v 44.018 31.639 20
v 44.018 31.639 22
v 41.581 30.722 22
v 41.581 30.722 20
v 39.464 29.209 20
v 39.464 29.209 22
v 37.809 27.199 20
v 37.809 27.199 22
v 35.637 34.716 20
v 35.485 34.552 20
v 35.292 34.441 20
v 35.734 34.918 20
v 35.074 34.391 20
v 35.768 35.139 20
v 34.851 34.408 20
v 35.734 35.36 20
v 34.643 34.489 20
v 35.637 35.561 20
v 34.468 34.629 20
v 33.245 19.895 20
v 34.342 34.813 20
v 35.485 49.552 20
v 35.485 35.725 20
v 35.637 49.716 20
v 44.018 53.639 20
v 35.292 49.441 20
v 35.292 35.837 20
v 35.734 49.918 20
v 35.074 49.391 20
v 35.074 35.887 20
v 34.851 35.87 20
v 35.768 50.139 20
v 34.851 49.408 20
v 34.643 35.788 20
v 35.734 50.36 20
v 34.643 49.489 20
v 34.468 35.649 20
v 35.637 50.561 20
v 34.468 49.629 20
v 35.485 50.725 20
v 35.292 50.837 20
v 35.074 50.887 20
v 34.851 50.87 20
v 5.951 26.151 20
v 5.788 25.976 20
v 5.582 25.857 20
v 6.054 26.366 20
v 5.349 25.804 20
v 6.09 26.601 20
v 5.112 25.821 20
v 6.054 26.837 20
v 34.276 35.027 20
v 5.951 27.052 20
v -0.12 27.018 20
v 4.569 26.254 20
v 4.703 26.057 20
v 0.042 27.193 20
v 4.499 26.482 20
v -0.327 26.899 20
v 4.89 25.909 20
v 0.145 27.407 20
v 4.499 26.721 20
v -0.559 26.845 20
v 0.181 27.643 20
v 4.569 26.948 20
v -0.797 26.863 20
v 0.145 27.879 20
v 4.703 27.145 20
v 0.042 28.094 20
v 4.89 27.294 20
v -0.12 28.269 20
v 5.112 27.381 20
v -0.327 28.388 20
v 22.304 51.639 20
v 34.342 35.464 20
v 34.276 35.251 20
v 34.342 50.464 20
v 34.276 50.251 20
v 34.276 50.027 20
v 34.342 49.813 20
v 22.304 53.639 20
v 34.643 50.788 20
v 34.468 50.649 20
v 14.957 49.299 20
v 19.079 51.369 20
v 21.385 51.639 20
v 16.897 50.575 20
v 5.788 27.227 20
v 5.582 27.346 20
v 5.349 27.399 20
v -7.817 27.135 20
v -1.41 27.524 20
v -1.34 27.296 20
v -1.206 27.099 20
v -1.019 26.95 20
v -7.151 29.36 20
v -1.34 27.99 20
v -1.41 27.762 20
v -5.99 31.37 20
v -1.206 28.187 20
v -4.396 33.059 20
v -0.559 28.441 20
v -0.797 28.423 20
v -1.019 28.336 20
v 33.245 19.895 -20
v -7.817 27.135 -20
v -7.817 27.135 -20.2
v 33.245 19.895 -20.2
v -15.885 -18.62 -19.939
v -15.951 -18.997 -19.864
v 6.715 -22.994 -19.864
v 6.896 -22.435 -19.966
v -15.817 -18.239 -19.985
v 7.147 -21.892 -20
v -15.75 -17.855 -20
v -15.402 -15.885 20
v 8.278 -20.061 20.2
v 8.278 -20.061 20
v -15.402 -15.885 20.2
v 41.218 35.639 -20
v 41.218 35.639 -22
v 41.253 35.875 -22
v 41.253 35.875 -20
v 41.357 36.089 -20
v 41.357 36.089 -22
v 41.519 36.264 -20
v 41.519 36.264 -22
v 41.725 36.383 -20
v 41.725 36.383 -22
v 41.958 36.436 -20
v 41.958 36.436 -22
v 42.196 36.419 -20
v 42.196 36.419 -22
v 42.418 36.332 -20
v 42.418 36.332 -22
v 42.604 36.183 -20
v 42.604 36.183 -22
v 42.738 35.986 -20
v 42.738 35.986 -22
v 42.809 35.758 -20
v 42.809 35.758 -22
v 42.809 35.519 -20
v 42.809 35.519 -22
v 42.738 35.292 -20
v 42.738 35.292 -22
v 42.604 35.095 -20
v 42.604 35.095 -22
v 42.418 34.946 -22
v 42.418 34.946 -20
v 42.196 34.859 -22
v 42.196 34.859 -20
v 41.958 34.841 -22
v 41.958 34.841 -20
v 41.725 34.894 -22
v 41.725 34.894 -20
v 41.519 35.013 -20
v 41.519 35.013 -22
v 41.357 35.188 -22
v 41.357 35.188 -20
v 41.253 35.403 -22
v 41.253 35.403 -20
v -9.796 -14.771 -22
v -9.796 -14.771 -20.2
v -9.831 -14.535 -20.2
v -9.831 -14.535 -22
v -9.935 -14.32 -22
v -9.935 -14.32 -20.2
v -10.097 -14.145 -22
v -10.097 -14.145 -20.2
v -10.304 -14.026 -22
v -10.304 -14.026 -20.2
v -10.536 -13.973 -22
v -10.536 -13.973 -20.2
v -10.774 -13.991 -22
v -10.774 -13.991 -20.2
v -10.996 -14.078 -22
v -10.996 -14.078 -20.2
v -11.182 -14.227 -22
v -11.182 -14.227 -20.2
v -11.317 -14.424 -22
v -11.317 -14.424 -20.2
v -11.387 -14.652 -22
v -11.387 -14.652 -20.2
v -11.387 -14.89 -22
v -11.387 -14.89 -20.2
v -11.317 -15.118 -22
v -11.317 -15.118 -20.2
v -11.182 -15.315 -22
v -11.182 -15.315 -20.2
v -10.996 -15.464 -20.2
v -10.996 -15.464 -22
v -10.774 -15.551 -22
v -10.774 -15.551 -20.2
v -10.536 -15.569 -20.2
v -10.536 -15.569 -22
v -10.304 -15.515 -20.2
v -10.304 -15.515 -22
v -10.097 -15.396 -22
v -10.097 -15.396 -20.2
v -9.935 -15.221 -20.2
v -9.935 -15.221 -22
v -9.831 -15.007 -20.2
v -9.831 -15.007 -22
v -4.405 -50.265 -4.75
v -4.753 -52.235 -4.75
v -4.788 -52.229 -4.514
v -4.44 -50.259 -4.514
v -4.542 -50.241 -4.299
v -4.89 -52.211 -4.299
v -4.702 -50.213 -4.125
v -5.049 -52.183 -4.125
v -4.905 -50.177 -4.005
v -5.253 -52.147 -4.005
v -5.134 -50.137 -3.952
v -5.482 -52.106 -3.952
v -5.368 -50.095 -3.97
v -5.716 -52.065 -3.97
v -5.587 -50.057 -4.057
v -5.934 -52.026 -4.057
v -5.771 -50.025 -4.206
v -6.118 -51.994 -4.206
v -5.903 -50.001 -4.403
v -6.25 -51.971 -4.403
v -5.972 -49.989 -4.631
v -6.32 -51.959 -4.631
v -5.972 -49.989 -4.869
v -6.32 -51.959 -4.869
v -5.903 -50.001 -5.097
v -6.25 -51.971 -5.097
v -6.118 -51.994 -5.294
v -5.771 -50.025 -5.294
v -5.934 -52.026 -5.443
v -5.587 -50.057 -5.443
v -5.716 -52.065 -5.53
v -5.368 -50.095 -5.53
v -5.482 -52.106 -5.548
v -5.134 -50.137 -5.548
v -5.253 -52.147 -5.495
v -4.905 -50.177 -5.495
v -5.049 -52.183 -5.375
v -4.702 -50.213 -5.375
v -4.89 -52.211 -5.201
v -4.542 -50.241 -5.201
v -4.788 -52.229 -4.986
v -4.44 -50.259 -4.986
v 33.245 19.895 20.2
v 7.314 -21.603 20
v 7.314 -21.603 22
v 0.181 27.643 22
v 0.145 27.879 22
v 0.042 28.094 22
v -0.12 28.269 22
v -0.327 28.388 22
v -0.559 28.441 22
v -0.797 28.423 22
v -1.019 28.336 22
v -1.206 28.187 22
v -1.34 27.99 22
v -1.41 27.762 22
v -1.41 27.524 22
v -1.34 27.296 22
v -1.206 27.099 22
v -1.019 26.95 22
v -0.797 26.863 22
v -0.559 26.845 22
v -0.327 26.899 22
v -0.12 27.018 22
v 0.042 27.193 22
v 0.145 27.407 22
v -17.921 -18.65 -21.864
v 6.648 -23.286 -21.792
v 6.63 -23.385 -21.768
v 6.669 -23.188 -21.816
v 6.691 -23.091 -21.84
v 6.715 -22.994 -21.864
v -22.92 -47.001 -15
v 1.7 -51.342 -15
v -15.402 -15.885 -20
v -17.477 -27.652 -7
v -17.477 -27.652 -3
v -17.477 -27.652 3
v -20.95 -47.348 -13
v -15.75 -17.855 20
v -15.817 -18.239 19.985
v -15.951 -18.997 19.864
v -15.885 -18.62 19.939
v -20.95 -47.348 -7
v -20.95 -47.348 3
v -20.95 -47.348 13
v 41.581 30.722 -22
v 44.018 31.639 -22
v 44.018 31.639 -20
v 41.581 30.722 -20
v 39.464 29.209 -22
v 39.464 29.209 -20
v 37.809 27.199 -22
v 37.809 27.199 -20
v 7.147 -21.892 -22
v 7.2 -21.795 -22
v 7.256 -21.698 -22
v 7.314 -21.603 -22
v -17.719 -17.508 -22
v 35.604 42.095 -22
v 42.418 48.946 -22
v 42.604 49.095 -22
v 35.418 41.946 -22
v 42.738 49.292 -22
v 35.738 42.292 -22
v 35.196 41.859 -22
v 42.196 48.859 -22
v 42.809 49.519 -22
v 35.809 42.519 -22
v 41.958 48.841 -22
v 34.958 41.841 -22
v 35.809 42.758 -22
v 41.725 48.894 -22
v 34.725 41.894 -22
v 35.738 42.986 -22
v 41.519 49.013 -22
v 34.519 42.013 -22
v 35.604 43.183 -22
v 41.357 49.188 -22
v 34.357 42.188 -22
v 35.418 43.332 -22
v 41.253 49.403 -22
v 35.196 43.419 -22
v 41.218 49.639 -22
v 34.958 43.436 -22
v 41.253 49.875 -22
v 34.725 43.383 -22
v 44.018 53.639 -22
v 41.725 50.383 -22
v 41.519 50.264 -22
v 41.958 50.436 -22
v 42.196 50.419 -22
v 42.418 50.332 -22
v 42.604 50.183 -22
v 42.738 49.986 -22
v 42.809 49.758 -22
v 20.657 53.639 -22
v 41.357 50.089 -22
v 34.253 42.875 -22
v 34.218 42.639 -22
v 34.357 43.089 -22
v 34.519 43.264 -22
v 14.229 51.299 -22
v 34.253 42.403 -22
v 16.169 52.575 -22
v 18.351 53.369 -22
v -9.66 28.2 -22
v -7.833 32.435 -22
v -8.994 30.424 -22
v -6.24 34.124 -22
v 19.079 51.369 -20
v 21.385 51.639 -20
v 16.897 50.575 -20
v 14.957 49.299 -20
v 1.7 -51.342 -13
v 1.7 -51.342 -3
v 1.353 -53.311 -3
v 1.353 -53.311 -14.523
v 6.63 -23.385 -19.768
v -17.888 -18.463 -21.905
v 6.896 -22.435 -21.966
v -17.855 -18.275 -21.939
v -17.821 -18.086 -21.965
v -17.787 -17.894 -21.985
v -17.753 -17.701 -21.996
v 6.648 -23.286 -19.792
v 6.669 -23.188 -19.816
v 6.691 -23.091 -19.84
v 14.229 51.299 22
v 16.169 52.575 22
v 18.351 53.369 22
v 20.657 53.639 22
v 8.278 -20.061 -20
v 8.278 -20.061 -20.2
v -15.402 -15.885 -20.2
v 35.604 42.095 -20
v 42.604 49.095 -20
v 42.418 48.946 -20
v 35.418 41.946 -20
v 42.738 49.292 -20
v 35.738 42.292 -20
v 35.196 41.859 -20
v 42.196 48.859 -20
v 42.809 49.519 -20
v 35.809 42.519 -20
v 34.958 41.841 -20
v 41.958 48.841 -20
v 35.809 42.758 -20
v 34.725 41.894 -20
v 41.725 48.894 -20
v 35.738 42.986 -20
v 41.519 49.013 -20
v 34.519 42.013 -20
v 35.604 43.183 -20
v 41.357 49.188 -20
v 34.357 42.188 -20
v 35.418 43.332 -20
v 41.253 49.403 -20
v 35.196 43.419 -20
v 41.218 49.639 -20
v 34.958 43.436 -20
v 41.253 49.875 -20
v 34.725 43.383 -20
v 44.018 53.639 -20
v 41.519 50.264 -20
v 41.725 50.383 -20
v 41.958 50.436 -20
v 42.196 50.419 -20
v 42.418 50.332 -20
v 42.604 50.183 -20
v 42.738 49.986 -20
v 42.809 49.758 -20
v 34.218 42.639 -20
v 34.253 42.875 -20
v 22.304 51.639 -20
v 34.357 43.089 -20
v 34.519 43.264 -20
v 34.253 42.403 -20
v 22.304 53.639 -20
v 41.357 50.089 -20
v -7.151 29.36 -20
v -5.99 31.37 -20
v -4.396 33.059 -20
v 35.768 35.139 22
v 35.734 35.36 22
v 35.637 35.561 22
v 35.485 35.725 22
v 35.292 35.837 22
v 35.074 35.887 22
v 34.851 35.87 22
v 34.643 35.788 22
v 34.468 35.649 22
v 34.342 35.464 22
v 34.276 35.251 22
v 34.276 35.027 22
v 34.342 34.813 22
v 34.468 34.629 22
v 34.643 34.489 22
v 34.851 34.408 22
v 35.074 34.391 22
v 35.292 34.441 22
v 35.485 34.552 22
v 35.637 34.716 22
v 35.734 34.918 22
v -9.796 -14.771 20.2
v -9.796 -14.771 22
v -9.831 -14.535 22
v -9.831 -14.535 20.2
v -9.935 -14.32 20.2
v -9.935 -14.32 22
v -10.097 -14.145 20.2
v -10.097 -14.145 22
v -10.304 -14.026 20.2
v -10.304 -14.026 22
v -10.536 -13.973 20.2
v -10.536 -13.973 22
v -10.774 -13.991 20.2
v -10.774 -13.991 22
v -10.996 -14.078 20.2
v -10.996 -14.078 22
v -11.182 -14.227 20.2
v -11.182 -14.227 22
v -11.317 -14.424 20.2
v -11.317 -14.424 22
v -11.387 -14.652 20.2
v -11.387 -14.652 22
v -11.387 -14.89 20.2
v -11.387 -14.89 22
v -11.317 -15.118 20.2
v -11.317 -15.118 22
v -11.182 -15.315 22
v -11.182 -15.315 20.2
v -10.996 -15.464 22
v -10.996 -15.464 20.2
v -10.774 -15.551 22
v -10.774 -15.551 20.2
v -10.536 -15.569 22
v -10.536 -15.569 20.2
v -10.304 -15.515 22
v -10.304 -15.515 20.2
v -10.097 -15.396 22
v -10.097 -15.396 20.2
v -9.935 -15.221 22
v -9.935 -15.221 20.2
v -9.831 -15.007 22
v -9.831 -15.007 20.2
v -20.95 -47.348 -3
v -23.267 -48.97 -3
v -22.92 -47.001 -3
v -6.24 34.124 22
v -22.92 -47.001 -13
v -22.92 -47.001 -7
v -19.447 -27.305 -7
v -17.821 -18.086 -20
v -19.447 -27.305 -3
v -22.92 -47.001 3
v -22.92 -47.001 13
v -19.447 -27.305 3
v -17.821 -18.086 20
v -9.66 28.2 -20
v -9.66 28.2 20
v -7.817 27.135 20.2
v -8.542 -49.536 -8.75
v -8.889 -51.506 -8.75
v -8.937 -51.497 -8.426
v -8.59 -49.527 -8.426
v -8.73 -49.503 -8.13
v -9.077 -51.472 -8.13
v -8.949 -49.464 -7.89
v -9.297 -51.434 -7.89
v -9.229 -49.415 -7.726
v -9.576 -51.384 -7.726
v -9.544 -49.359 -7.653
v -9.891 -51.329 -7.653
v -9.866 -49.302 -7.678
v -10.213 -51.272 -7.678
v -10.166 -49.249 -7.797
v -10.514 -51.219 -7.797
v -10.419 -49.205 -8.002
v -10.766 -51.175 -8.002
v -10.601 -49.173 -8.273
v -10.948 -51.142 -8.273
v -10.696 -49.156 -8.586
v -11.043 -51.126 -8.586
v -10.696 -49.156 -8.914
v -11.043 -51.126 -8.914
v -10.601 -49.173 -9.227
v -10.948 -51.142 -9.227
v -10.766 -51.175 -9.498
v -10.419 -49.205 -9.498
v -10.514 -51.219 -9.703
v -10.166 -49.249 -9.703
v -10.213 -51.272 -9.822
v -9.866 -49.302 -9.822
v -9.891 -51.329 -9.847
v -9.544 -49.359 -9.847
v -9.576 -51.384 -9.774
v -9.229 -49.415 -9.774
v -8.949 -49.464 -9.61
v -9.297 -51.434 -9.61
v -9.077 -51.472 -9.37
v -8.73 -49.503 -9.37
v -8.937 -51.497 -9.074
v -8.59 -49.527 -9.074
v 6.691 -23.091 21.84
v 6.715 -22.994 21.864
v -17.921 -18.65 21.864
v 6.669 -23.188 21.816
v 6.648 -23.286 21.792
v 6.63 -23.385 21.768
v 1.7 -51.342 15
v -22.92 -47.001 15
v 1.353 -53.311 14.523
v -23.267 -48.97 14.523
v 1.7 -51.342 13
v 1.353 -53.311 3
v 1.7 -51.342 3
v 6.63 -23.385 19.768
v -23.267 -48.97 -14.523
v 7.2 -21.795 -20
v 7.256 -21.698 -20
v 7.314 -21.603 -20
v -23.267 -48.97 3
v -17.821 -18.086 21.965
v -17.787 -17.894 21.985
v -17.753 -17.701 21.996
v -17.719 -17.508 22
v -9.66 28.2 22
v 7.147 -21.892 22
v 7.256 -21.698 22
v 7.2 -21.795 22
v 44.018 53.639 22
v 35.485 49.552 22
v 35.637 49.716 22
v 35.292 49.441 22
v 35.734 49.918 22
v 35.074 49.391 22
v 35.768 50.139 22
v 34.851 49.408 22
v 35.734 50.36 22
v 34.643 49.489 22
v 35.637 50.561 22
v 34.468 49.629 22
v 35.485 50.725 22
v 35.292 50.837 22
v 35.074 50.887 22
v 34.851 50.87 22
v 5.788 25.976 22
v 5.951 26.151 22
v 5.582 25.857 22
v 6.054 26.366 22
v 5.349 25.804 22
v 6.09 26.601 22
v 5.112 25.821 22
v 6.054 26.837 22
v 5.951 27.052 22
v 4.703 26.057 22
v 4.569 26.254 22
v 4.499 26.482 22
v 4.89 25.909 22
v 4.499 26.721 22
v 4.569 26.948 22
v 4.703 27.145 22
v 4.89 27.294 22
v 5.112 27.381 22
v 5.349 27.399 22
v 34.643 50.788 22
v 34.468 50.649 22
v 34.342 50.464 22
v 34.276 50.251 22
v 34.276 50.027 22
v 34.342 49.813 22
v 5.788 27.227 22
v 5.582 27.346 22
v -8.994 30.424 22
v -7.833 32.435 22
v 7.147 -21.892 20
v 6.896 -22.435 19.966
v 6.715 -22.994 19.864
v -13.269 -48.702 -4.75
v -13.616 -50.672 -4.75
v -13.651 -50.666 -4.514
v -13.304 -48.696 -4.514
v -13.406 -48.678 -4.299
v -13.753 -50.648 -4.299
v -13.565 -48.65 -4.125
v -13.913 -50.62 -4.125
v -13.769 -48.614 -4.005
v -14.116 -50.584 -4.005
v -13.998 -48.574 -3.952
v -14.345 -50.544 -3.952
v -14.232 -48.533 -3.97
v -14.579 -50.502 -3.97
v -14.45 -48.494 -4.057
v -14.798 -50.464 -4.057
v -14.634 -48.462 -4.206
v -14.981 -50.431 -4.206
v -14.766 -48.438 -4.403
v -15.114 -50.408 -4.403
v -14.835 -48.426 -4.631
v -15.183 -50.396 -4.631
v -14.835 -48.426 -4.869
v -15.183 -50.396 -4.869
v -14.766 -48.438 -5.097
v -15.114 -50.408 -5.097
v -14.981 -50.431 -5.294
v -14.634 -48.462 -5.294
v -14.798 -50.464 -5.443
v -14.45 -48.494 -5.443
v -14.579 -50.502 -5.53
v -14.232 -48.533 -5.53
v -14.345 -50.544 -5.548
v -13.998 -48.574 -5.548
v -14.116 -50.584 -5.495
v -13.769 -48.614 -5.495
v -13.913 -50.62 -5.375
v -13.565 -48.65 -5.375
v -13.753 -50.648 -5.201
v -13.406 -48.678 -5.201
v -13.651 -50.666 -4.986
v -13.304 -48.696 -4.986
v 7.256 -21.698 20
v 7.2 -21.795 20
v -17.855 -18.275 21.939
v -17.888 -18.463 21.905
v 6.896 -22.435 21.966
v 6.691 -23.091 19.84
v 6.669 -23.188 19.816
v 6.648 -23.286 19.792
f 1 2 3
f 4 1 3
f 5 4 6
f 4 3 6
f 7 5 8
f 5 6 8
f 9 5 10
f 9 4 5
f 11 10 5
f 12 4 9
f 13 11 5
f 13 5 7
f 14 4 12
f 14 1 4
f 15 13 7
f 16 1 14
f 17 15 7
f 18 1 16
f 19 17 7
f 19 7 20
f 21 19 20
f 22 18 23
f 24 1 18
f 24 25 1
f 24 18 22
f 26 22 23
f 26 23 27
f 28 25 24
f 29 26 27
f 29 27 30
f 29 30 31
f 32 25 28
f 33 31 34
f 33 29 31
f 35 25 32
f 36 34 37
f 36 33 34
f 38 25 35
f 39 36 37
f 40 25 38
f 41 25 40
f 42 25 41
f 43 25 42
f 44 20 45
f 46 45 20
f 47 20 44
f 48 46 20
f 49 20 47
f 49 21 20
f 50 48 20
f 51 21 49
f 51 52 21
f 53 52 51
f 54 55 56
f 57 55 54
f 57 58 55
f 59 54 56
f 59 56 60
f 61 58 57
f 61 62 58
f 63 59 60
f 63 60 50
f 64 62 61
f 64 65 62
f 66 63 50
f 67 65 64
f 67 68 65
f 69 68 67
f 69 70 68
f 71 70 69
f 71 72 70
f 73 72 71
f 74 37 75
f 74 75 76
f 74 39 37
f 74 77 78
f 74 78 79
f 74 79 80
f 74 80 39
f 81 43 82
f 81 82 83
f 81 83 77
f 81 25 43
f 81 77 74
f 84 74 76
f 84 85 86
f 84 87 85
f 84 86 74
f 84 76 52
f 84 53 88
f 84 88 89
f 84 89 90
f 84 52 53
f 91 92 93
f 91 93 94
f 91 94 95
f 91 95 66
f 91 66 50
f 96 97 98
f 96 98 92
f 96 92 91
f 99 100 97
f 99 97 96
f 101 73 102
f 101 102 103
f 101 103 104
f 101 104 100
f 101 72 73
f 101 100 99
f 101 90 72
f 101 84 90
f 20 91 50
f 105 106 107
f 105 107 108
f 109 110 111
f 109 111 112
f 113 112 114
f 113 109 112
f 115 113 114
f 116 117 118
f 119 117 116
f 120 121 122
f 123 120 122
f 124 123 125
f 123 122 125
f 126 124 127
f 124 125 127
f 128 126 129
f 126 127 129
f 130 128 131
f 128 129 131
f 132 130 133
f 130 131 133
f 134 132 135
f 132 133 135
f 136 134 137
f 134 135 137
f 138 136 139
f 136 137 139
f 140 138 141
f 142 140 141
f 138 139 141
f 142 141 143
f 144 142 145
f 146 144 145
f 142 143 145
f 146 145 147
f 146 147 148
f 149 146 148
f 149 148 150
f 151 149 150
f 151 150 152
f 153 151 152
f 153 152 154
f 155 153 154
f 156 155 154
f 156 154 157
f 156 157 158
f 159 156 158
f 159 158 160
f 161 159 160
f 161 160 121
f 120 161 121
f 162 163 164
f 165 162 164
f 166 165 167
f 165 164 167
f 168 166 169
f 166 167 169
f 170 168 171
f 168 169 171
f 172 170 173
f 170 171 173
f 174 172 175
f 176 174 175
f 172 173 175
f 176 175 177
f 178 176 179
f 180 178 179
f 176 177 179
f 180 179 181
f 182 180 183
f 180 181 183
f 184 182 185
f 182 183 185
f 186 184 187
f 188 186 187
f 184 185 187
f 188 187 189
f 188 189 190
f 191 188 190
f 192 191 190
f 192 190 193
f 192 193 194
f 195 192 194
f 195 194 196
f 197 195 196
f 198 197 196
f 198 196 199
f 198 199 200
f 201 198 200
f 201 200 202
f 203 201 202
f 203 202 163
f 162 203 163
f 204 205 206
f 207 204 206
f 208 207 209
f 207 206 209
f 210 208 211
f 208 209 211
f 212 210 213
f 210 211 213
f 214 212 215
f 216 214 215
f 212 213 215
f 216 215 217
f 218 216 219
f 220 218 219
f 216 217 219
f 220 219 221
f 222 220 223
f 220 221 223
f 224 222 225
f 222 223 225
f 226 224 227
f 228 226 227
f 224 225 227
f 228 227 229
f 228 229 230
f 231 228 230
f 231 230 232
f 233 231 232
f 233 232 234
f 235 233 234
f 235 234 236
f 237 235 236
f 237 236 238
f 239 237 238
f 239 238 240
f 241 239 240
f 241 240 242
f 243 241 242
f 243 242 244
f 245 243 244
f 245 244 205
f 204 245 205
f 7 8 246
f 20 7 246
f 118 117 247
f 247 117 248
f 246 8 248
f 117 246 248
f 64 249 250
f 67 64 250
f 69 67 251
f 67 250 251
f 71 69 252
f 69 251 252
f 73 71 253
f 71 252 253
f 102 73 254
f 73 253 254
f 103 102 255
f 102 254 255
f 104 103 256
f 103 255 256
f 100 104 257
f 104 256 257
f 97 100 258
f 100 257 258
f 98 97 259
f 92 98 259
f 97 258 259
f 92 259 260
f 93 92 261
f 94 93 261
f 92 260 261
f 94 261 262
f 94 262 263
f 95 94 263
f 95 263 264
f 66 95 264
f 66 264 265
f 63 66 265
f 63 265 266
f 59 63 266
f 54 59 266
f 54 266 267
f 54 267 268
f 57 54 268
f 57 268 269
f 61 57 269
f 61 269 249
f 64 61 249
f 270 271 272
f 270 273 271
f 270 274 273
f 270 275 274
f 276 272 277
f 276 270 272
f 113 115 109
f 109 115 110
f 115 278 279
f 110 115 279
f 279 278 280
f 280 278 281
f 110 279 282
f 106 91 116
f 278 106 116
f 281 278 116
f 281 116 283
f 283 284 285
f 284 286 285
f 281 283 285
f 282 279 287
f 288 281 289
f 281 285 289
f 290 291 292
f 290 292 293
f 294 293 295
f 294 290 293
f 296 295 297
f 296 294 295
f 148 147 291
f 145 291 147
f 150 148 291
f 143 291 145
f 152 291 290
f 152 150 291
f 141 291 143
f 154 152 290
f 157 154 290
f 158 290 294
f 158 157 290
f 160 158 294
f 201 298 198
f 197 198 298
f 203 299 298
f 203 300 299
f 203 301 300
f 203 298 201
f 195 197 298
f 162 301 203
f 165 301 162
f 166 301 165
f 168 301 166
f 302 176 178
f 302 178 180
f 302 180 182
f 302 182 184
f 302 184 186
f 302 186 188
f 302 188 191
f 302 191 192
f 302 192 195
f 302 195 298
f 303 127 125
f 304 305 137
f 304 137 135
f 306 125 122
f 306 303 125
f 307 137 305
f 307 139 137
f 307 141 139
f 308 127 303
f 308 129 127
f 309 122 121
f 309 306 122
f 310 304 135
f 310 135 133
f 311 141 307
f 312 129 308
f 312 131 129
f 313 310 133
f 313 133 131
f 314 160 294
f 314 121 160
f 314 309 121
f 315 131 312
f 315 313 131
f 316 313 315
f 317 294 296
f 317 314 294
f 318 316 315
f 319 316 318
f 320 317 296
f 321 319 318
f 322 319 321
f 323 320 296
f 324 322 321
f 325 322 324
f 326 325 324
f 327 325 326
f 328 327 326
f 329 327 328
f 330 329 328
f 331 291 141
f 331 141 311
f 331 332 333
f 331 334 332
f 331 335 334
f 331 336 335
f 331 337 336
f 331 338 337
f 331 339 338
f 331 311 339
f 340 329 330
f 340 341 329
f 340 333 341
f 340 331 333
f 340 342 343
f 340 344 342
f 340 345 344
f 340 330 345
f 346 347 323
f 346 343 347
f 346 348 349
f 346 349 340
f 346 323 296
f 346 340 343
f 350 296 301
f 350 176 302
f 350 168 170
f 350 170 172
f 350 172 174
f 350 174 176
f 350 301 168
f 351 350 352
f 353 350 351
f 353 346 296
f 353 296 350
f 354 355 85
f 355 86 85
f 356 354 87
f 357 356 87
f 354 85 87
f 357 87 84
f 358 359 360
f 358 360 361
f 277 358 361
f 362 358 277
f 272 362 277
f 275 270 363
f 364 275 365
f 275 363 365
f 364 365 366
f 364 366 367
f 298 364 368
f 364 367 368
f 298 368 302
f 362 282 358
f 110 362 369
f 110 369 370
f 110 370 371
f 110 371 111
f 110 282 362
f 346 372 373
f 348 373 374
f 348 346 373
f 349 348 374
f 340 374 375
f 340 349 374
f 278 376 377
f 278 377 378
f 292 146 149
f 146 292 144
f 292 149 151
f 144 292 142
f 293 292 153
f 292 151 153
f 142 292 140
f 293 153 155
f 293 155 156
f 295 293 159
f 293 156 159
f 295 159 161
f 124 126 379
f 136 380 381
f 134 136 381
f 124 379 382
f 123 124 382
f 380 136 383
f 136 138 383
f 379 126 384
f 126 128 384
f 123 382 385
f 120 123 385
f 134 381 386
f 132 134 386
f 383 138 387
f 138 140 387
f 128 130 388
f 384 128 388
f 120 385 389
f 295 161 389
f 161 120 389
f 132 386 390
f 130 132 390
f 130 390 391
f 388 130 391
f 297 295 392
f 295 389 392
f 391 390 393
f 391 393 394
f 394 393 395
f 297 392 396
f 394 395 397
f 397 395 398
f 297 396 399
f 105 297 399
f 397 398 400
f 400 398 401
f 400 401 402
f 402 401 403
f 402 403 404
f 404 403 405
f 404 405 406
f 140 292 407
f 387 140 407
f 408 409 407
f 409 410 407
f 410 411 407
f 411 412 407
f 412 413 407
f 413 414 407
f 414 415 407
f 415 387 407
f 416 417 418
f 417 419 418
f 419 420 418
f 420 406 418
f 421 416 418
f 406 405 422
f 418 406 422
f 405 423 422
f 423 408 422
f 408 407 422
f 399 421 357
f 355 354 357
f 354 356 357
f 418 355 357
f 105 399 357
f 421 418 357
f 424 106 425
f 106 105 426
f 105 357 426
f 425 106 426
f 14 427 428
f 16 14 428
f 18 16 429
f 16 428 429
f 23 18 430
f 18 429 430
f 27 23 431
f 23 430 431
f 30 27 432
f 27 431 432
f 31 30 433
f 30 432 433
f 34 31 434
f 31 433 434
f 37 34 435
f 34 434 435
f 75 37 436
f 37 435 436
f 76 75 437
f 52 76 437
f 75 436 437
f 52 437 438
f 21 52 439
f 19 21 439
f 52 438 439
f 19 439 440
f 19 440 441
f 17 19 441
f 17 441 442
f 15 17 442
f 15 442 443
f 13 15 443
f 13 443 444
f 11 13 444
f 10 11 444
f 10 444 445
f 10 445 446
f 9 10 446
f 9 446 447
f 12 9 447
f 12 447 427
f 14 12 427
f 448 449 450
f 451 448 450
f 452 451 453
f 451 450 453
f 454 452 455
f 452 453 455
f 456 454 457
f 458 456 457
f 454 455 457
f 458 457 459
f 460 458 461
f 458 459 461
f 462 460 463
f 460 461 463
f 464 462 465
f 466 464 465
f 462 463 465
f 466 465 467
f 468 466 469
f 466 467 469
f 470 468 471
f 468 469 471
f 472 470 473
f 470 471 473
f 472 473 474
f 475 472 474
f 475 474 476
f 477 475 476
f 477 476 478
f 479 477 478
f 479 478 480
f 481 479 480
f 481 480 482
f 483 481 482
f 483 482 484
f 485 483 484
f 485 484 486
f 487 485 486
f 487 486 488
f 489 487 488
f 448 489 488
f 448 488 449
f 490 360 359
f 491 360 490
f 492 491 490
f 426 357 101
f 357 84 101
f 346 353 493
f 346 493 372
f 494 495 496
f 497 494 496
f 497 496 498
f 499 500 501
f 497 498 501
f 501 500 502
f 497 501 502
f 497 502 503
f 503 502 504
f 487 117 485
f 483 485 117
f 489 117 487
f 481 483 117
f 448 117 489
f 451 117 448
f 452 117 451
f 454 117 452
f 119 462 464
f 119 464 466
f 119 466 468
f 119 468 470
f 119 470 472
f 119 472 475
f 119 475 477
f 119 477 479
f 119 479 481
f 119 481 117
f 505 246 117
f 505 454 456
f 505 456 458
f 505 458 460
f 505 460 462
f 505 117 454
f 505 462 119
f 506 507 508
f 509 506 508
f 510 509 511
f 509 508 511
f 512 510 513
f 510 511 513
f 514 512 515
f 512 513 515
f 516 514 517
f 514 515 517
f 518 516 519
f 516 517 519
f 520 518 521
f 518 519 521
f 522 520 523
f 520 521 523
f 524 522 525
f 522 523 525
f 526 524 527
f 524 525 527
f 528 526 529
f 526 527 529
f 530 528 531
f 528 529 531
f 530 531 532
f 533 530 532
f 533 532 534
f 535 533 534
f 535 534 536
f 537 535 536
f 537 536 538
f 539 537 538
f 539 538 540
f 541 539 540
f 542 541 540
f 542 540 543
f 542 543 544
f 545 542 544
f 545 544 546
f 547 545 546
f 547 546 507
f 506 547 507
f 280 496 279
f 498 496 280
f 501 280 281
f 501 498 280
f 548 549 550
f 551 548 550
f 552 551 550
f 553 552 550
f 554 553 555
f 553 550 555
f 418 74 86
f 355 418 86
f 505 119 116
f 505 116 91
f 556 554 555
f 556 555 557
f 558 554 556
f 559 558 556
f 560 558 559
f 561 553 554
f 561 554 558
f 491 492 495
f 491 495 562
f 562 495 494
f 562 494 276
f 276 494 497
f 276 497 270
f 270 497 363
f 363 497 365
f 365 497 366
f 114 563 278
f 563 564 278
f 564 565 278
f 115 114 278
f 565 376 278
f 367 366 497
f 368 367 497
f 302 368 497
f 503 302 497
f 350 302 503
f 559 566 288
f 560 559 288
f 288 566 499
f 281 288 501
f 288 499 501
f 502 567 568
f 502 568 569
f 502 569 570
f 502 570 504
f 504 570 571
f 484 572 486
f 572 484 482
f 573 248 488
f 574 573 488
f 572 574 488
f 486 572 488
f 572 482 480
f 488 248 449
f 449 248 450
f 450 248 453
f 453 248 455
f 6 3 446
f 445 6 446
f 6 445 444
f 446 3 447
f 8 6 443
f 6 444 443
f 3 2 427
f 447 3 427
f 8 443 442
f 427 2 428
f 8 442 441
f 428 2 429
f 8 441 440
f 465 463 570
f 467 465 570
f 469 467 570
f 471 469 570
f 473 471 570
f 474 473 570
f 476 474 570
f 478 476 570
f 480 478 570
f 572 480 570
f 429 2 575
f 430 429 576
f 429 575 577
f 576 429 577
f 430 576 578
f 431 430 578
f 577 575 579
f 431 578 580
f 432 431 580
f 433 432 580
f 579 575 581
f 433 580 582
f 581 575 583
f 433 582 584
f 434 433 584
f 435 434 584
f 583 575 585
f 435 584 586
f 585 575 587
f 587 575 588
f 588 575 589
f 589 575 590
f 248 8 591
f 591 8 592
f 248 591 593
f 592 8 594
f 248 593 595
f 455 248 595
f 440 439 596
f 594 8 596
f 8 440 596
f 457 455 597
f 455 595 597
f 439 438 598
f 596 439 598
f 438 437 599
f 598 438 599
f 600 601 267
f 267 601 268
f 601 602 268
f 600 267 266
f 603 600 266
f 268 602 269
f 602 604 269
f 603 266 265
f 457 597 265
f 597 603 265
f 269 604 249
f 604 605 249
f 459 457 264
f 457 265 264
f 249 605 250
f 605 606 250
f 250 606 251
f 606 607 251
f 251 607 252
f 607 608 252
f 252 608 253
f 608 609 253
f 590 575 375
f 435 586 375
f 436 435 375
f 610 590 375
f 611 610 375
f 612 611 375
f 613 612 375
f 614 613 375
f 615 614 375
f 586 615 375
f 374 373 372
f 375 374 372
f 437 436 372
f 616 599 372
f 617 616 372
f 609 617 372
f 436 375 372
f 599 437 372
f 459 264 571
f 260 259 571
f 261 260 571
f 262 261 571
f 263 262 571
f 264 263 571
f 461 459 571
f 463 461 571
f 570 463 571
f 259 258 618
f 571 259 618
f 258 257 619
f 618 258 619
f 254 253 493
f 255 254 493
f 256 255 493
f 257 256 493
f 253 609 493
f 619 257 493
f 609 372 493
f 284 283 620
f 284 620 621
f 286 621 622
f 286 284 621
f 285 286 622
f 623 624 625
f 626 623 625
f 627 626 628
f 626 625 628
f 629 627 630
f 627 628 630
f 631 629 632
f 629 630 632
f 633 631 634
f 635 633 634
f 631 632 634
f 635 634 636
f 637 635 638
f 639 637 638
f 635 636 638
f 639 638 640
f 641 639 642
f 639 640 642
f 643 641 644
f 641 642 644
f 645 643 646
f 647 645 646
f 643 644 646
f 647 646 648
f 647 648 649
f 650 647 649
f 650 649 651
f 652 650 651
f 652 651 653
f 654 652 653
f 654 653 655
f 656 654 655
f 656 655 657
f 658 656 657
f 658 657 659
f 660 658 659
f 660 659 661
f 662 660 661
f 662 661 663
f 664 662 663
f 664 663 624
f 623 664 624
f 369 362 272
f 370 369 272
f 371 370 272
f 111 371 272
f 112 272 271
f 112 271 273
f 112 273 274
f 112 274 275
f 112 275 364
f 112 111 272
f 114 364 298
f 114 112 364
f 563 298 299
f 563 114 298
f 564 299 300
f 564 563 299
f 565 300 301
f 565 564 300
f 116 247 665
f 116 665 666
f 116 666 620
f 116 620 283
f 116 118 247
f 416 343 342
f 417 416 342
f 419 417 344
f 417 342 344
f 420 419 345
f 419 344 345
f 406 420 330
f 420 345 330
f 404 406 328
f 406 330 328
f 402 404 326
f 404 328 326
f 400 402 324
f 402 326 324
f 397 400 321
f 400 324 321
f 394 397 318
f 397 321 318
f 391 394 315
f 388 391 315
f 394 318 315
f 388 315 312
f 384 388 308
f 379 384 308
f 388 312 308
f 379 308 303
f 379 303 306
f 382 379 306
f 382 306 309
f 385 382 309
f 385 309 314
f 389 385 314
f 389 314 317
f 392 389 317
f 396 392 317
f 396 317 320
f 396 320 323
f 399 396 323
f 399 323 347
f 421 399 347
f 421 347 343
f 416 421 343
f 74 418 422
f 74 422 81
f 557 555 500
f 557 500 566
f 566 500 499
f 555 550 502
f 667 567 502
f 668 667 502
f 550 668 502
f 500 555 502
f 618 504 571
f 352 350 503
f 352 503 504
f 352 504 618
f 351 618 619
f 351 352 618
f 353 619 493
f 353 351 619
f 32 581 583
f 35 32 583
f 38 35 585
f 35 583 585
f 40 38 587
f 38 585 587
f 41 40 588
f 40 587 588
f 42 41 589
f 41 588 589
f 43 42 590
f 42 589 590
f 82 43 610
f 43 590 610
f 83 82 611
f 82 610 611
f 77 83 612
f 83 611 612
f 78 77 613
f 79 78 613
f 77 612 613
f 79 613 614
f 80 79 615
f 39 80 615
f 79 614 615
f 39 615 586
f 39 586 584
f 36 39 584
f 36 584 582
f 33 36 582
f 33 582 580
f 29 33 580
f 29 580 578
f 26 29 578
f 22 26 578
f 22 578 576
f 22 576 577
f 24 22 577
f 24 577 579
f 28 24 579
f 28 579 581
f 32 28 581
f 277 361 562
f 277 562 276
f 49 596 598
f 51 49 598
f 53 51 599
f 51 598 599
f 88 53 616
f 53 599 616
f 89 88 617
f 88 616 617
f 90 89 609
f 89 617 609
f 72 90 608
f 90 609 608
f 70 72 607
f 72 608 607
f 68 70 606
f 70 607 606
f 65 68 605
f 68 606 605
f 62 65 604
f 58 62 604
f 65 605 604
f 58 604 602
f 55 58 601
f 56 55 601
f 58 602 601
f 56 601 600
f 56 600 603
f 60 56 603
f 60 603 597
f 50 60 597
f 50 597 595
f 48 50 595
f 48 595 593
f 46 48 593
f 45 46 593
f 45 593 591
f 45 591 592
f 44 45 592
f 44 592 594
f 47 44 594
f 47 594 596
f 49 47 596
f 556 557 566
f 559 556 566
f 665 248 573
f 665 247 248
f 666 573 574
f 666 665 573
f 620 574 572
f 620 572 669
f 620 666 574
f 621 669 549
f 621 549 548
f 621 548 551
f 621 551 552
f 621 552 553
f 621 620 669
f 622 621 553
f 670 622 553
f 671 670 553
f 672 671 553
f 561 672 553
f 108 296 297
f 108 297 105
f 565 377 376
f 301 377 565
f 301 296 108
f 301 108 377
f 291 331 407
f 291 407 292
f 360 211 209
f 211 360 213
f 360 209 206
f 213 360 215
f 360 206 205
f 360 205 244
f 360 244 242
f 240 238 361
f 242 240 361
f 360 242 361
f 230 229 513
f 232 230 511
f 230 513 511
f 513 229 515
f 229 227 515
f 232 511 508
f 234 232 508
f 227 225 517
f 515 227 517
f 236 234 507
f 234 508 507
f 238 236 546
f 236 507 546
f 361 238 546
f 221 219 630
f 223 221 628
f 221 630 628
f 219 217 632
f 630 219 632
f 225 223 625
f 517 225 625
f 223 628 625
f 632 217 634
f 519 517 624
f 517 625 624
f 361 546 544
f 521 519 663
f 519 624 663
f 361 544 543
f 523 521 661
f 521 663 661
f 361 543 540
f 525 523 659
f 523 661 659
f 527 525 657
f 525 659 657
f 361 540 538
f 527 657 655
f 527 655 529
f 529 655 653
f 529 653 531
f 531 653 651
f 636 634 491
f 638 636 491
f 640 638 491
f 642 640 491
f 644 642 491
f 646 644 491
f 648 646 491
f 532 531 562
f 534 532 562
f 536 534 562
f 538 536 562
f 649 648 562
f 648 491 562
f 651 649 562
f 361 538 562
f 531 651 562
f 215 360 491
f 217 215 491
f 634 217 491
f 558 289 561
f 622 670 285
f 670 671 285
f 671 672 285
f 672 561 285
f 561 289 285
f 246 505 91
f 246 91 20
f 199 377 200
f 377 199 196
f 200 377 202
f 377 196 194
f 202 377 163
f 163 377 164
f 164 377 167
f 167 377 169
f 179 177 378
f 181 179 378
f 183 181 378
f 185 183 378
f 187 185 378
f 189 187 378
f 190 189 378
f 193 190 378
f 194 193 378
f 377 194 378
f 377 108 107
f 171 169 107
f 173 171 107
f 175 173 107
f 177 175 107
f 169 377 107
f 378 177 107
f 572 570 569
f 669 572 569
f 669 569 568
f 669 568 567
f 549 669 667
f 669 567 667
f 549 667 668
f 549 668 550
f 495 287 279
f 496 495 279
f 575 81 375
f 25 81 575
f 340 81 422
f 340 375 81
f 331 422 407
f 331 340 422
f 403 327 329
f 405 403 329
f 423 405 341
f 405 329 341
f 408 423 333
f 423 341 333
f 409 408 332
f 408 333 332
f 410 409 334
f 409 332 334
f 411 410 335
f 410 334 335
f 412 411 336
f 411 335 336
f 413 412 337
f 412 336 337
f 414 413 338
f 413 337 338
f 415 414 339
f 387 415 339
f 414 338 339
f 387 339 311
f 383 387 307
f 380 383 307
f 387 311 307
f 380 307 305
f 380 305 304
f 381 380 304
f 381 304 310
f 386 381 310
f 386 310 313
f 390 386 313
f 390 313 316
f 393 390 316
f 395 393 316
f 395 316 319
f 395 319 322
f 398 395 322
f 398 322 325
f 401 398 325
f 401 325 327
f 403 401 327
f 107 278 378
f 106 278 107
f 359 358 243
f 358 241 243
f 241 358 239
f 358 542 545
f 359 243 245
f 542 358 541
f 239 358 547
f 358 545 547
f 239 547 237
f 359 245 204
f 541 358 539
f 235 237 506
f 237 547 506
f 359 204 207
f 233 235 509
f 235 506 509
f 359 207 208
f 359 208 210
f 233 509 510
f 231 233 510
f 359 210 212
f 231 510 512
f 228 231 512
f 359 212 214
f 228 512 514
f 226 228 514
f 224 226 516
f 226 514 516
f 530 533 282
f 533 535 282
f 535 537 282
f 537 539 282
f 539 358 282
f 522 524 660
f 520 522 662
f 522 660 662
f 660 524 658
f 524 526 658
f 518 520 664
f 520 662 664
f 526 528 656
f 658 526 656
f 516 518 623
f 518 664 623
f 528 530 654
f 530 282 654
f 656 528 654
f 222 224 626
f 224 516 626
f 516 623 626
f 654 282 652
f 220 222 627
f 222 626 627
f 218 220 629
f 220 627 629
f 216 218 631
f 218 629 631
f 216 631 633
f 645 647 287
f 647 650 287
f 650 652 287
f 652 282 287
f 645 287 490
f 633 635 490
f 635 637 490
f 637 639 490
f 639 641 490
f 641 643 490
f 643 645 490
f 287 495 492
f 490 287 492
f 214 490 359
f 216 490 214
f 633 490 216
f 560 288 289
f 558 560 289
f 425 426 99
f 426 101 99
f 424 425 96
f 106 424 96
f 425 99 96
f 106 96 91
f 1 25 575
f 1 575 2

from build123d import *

# Parameters (mm, degrees)
EXTRUDE_1_DEPTH      = 20
CUT_EXTRUDE_1_DEPTH  = 2
EXTRUDE_START        = 2
EXTRUDE_2_DEPTH      = 2
EXTRUDE_3_DEPTH      = 33
CUT_EXTRUDE_10_DEPTH = 22.5
EXTRUDE_4_DEPTH      = 25
SKETCH_19_W          = 6
SKETCH_19_H          = 22
CUT_EXTRUDE_11_DEPTH = 84.590810023
CUT_EXTRUDE_7_REACH  = 84.162
SKETCH_15_R          = 0.75
CUT_EXTRUDE_8_REACH  = 84.162
SKETCH_16_R          = 0.8
CUT_EXTRUDE_9_REACH  = 117.914
SKETCH_17_W          = 21.713584054
SKETCH_17_H          = 40
CUT_EXTRUDE_13_REACH = 84.162
SKETCH_23_R          = 0.8
SKETCH_24_R          = 0.8
CUT_EXTRUDE_14_DEPTH = 83.162435205
SKETCH_25_W          = 4
SKETCH_25_H          = 20
CUT_EXTRUDE_15_DEPTH = 82.996087258
CUT_EXTRUDE_16_REACH = 121.797
SKETCH_26_R          = 0.8
CUT_EXTRUDE_17_REACH = 121.797
SKETCH_27_R          = 1.1
FILLET_1_R           = 5
FILLET_2_R           = 5
FILLET_3_R           = 5
CUT_EXTRUDE_18_DEPTH = 20.2


with BuildPart() as part:
    # 草图1 → 凸台-拉伸1 (new, symmetric)
    with BuildSketch(Plane.XY):
        with BuildLine():
            Line((20.657346874, 53.638724152), (44.017644532, 53.638724152))
            Line((44.017644532, 53.638724152), (44.017644532, 51.638724152))
            Line((44.017644532, 51.638724152), (21.385287343, 51.638724152))
            ThreePointArc((21.385287343, 51.638724152), (17.96508591, 51.03565036), (14.957411246, 49.299168583))
            Line((14.957411246, 49.299168583), (-4.39648281, 33.059323219))
            ThreePointArc((-4.39648281, 33.059323219), (-6.628860751, 30.398878788), (-7.816684243, 27.135360565))
            Line((-7.816684243, 27.135360565), (-20.950105242, -47.347971173))
            Line((-20.950105242, -47.347971173), (-22.919720748, -47.000674818))
            Line((-22.919720748, -47.000674818), (-9.659894213, 28.199538337))
            ThreePointArc((-9.659894213, 28.199538337), (-8.472070721, 31.463056561), (-6.23969278, 34.123500992))
            Line((-6.23969278, 34.123500992), (14.229470778, 51.299168583))
            ThreePointArc((14.229470778, 51.299168583), (17.237145441, 53.03565036), (20.657346874, 53.638724152))
        make_face()
    extrude(amount=EXTRUDE_1_DEPTH, both=True)

    # 草图3 → 切除-拉伸1 (cut)
    with BuildSketch(Plane(origin=(-14.191017833, 2.502259328, 0), x_dir=(0, 0, 1), z_dir=(-0.9848077530122074, 0.17364817766693458, 0))):
        Polygon((13, -50.266596698), (20, -50.266596698), (20, -20.906299041), align=None)
    cut_extrude_1 = extrude(amount=-CUT_EXTRUDE_1_DEPTH, mode=Mode.SUBTRACT)

    # 镜向1: 切除-拉伸1 across plane
    add(cut_extrude_1.mirror(Plane.XY), mode=Mode.SUBTRACT)

    # 草图4 → 凸台-拉伸2 (add)
    with BuildSketch(Plane.XY.offset(20).offset(EXTRUDE_START)):
        with BuildLine():
            Line((44.017644532, 53.638724152), (44.017644532, 31.638724152))
            ThreePointArc((44.017644532, 31.638724152), (40.473292143, 30.034681338), (37.809285693, 27.199464091))
            Line((37.809285693, 27.199464091), (6.798835262, -22.427630496))
            Line((6.798835262, -22.427630496), (-17.821358564, -18.086426054))
            Line((-17.821358564, -18.086426054), (-9.659894213, 28.199538337))
            ThreePointArc((-9.659894213, 28.199538337), (-8.472070721, 31.463056561), (-6.23969278, 34.123500992))
            Line((-6.23969278, 34.123500992), (14.229470778, 51.299168583))
            ThreePointArc((14.229470778, 51.299168583), (17.237145441, 53.03565036), (20.657346874, 53.638724152))
            Line((20.657346874, 53.638724152), (44.017644532, 53.638724152))
        make_face()
    extrude_2 = extrude(amount=-EXTRUDE_2_DEPTH)

    # 草图5 → 凸台-拉伸3 (add)
    with BuildSketch(Plane(origin=(-14.191017833, 2.502259328, 0), x_dir=(0, 0, 1), z_dir=(-0.9848077530122074, 0.17364817766693458, 0))):
        Polygon((22, -20.906299041), (15, -50.266596698), (13, -50.266596698), (20, -20.906299041), align=None)
    extrude_3 = extrude(amount=-EXTRUDE_3_DEPTH)

    # 镜向3: 凸台-拉伸2, 凸台-拉伸3 across plane
    add(extrude_2.mirror(Plane.XY))
    add(extrude_3.mirror(Plane.XY))

    # 草图18 → 切除-拉伸10 (cut, symmetric)
    with BuildSketch(Plane.XY):
        Polygon((6.798835262, -22.427630496), (1.700473078, -51.34187926), (9.578935102, -52.731064681), (14.677297286, -23.816815917), align=None)
    extrude(amount=CUT_EXTRUDE_10_DEPTH, both=True, mode=Mode.SUBTRACT)

    # 草图10 → 凸台-拉伸4 (add)
    with BuildSketch(Plane(origin=(-14.191017833, 2.502259328, 0), x_dir=(0, 0, 1), z_dir=(-0.9848077530122074, 0.17364817766693458, 0))):
        Polygon((-15, -50.266596698), (15, -50.266596698), (14.523165597, -52.266596698), (-14.523165597, -52.266596698), align=None)
    extrude(amount=-EXTRUDE_4_DEPTH)

    # 草图19 → 切除-拉伸11 (cut, through all)
    with BuildSketch(Plane(origin=(-14.191017833, 2.502259328, 0), x_dir=(0, 0, 1), z_dir=(-0.9848077530122074, 0.17364817766693458, 0))):
        with Locations((0, -41.266596698)):
            Rectangle(SKETCH_19_W, SKETCH_19_H)
    extrude(amount=-CUT_EXTRUDE_11_DEPTH, mode=Mode.SUBTRACT)

    # 草图15 → 切除-拉伸7 (cut, up to next)
    with BuildSketch(Plane.XY.offset(22), mode=Mode.PRIVATE) as cut_extrude_7_sk1:
        with Locations((35.017644532, 50.138724152)):
            Circle(SKETCH_15_R)
    cut_extrude_7_tool1 = extrude(cut_extrude_7_sk1.sketch, amount=-CUT_EXTRUDE_7_REACH, mode=Mode.PRIVATE) & part.part
    # 草图15 → 切除-拉伸7 (cut, up to next)
    with BuildSketch(Plane.XY.offset(22), mode=Mode.PRIVATE) as cut_extrude_7_sk2:
        with Locations((35.017644532, 35.138724152)):
            Circle(SKETCH_15_R)
    cut_extrude_7_tool2 = extrude(cut_extrude_7_sk2.sketch, amount=-CUT_EXTRUDE_7_REACH, mode=Mode.PRIVATE) & part.part
    add(cut_extrude_7_tool1.solids().sort_by_distance((35.017645, 50.138724, 22))[0], mode=Mode.SUBTRACT)
    add(cut_extrude_7_tool2.solids().sort_by_distance((35.017645, 35.138724, 22))[0], mode=Mode.SUBTRACT)

    # 草图16 → 切除-拉伸8 (cut, up to next)
    with BuildSketch(Plane(origin=(0, 0, -22), x_dir=(-1, 0, 0), z_dir=(0, 0, -1)), mode=Mode.PRIVATE) as cut_extrude_8_sk1:
        with Locations((-42.017644532, 49.638724152)):
            Circle(SKETCH_16_R)
    cut_extrude_8_tool1 = extrude(cut_extrude_8_sk1.sketch, amount=-CUT_EXTRUDE_8_REACH, mode=Mode.PRIVATE) & part.part
    # 草图16 → 切除-拉伸8 (cut, up to next)
    with BuildSketch(Plane(origin=(0, 0, -22), x_dir=(-1, 0, 0), z_dir=(0, 0, -1)), mode=Mode.PRIVATE) as cut_extrude_8_sk2:
        with Locations((-42.017644532, 35.638724152)):
            Circle(SKETCH_16_R)
    cut_extrude_8_tool2 = extrude(cut_extrude_8_sk2.sketch, amount=-CUT_EXTRUDE_8_REACH, mode=Mode.PRIVATE) & part.part
    # 草图16 → 切除-拉伸8 (cut, up to next)
    with BuildSketch(Plane(origin=(0, 0, -22), x_dir=(-1, 0, 0), z_dir=(0, 0, -1)), mode=Mode.PRIVATE) as cut_extrude_8_sk3:
        with Locations((-35.017644532, 42.638724152)):
            Circle(SKETCH_16_R)
    cut_extrude_8_tool3 = extrude(cut_extrude_8_sk3.sketch, amount=-CUT_EXTRUDE_8_REACH, mode=Mode.PRIVATE) & part.part
    add(cut_extrude_8_tool1.solids().sort_by_distance((42.017645, 49.638724, -22))[0], mode=Mode.SUBTRACT)
    add(cut_extrude_8_tool2.solids().sort_by_distance((42.017645, 35.638724, -22))[0], mode=Mode.SUBTRACT)
    add(cut_extrude_8_tool3.solids().sort_by_distance((35.017645, 42.638724, -22))[0], mode=Mode.SUBTRACT)

    # 草图17 → 切除-拉伸9 (cut, up to next)
    with BuildSketch(Plane.XZ.offset(-51.638724152), mode=Mode.PRIVATE) as cut_extrude_9_sk1:
        with Locations((33.160852505, 0)):
            Rectangle(SKETCH_17_W, SKETCH_17_H)
    cut_extrude_9_tool1 = extrude(cut_extrude_9_sk1.sketch, amount=-CUT_EXTRUDE_9_REACH, mode=Mode.PRIVATE) & part.part
    add(cut_extrude_9_tool1.solids().sort_by_distance((33.160853, 51.638724, 0))[0], mode=Mode.SUBTRACT)

    # 草图23 → 切除-拉伸13 (cut, up to next)
    with BuildSketch(Plane.XY.offset(22), mode=Mode.PRIVATE) as cut_extrude_13_sk1:
        with Locations((-0.619145661, 27.643236889)):
            Circle(SKETCH_23_R)
    cut_extrude_13_tool1 = extrude(cut_extrude_13_sk1.sketch, amount=-CUT_EXTRUDE_13_REACH, mode=Mode.PRIVATE) & part.part
    # 草图23 → 切除-拉伸13 (cut, up to next)
    with BuildSketch(Plane.XY.offset(22), mode=Mode.PRIVATE) as cut_extrude_13_sk2:
        with Locations((5.289700857, 26.601347823)):
            Circle(SKETCH_23_R)
    cut_extrude_13_tool2 = extrude(cut_extrude_13_sk2.sketch, amount=-CUT_EXTRUDE_13_REACH, mode=Mode.PRIVATE) & part.part
    add(cut_extrude_13_tool1.solids().sort_by_distance((-0.619146, 27.643237, 22))[0], mode=Mode.SUBTRACT)
    add(cut_extrude_13_tool2.solids().sort_by_distance((5.289701, 26.601348, 22))[0], mode=Mode.SUBTRACT)

    # 草图24 → 切除-拉伸14 (cut, through all)
    with BuildSketch(Plane.XY.offset(22)):
        with Locations((-10.595826096, -14.770754093)):
            Circle(SKETCH_24_R)
    extrude(amount=-CUT_EXTRUDE_14_DEPTH, mode=Mode.SUBTRACT)

    # 草图25 → 切除-拉伸15 (cut, through all)
    with BuildSketch(Plane(origin=(-12.221402327, 2.154962972, 0), x_dir=(0, 0, -1), z_dir=(0.9848077530122075, -0.1736481776669347, 0))):
        with Locations((5, -40.266596698)):
            Rectangle(SKETCH_25_W, SKETCH_25_H)
    extrude(amount=-CUT_EXTRUDE_15_DEPTH, mode=Mode.SUBTRACT)

    # 草图26 → 切除-拉伸16 (cut, up to next)
    with BuildSketch(Plane(origin=(-9.075999269, -51.472549652, 0), x_dir=(0.9848077530122074, -0.17364817766693458, 0), z_dir=(-0.17364817766693458, -0.9848077530122074, 0)), mode=Mode.PRIVATE) as cut_extrude_16_sk1:
        with Locations((3.590062842, -4.75)):
            Circle(SKETCH_26_R)
    cut_extrude_16_tool1 = extrude(cut_extrude_16_sk1.sketch, amount=-CUT_EXTRUDE_16_REACH, mode=Mode.PRIVATE) & part.part
    # 草图26 → 切除-拉伸16 (cut, up to next)
    with BuildSketch(Plane(origin=(-9.075999269, -51.472549652, 0), x_dir=(0.9848077530122074, -0.17364817766693458, 0), z_dir=(-0.17364817766693458, -0.9848077530122074, 0)), mode=Mode.PRIVATE) as cut_extrude_16_sk2:
        with Locations((-5.409937158, -4.75)):
            Circle(SKETCH_26_R)
    cut_extrude_16_tool2 = extrude(cut_extrude_16_sk2.sketch, amount=-CUT_EXTRUDE_16_REACH, mode=Mode.PRIVATE) & part.part
    add(cut_extrude_16_tool1.solids().sort_by_distance((-5.540478, -52.095958, -4.75))[0], mode=Mode.SUBTRACT)
    add(cut_extrude_16_tool2.solids().sort_by_distance((-14.403747, -50.533124, -4.75))[0], mode=Mode.SUBTRACT)

    # 草图27 → 切除-拉伸17 (cut, up to next)
    with BuildSketch(Plane(origin=(-9.075999269, -51.472549652, 0), x_dir=(0.9848077530122074, -0.17364817766693458, 0), z_dir=(-0.17364817766693458, -0.9848077530122074, 0)), mode=Mode.PRIVATE) as cut_extrude_17_sk1:
        with Locations((-0.909937158, -8.75)):
            Circle(SKETCH_27_R)
    cut_extrude_17_tool1 = extrude(cut_extrude_17_sk1.sketch, amount=-CUT_EXTRUDE_17_REACH, mode=Mode.PRIVATE) & part.part
    add(cut_extrude_17_tool1.solids().sort_by_distance((-9.972112, -51.314541, -8.75))[0], mode=Mode.SUBTRACT)

    # 圆角1
    fillet_1_edges = [part.edges().sort_by_distance(p)[0] for p in [
        (-5.511261651, -20.257028275, -22),
        (-5.511261651, -20.257028275, 22),
    ]]
    fillet(fillet_1_edges, radius=FILLET_1_R)

    # 圆角2
    fillet_2_edges = [part.edges().sort_by_distance(p)[0] for p in [
        (-4.526453898, -20.430676453, -20),
        (-4.526453898, -20.430676453, 20),
    ]]
    fillet(fillet_2_edges, radius=FILLET_2_R)

    # 圆角3
    fillet_3_edges = [part.edges().sort_by_distance(p)[0] for p in [
        (6.798835262, -22.427630496, 20.965328277),
        (6.798835262, -22.427630496, -20.965328277),
    ]]
    fillet(fillet_3_edges, radius=FILLET_3_R)

    # 草图28 → 切除-拉伸18 (cut, symmetric)
    with BuildSketch(Plane.XY):
        Polygon((-15.402375378, -15.885231658), (-7.816684243, 27.135360565), (37.188945048, 19.199653837), (27.398461996, -23.432174084), align=None)
    extrude(amount=CUT_EXTRUDE_18_DEPTH, both=True, mode=Mode.SUBTRACT)


solid = part.part
